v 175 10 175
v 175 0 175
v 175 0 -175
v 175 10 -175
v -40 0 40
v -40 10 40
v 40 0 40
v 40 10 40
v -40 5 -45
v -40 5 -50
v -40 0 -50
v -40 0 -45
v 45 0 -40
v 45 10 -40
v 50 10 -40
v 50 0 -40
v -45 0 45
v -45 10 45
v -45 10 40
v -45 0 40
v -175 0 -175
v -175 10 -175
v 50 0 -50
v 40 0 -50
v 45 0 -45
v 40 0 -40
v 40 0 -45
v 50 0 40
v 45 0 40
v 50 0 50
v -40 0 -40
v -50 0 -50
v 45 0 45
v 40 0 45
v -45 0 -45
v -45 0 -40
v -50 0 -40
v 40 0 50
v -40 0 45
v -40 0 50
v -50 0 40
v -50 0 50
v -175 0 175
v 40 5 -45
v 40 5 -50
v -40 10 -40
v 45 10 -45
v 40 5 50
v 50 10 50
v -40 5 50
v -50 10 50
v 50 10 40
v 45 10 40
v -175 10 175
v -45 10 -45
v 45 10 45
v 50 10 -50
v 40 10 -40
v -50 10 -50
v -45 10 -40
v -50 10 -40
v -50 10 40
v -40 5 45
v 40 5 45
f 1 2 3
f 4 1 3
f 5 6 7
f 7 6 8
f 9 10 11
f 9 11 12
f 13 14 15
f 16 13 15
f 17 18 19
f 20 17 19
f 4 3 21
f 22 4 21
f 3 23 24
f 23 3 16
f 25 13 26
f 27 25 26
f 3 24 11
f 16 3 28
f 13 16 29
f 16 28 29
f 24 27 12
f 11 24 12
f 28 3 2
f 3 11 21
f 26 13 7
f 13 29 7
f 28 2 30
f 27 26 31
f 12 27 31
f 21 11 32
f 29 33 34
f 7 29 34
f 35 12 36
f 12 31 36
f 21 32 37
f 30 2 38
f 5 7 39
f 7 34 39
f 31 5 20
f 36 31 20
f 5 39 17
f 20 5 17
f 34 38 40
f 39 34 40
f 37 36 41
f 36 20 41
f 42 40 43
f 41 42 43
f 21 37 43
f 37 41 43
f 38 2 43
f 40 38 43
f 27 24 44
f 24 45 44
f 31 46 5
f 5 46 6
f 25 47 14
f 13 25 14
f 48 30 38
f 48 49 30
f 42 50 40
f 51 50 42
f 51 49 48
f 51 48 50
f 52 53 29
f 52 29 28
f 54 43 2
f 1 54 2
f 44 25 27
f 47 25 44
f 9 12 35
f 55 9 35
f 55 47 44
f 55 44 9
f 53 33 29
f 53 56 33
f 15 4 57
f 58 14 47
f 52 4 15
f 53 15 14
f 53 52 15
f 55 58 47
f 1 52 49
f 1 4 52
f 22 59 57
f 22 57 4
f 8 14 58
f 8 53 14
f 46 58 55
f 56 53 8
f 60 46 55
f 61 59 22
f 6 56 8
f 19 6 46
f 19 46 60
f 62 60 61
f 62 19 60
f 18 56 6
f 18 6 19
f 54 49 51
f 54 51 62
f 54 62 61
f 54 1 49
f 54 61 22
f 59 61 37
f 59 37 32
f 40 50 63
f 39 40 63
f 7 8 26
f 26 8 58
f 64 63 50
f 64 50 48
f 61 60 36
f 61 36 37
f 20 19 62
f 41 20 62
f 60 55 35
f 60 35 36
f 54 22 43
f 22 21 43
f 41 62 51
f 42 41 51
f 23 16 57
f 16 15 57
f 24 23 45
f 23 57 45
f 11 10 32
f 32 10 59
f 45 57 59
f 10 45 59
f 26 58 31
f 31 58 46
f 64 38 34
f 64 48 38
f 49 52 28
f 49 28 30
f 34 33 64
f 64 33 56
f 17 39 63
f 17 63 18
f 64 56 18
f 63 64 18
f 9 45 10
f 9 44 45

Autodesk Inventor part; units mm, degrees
ref_plane "YZ Plane" through (0, 0, 0) normal (1, 0, 0) x (0, 1, 0)
ref_plane "XZ Plane" through (0, 0, 0) normal (0, 1, 0) x (-1, 0, 0)
ref_plane "XY Plane" through (0, 0, 0) normal (0, 0, 1) x (1, 0, 0)
sketch "Sketch1" plane through (0, 0, 0) normal (0, 1, 0) x (-1, 0, 0)
  line L0 (-175, 175) -> (-175, -175)
  line L1 (-175, -175) -> (175, -175)
  line L2 (175, -175) -> (175, 175)
  line L3 (175, 175) -> (-175, 175)
  line L4 (-175, 175) -> (175, -175) construction
  line L5 (-175, -175) -> (175, 175) construction
  point P0 (0, 0)
  dimension "d0" = 350
  dimension "d1" = 350
extrude "Extrusion1" add sketch "Sketch1" along normal blind 10
sketch "Sketch2" plane through (0, 10, 0) normal (0, 1, 0) x (1, 0, 0)
  line L0 (175, -175) -> (175, 175) projected
  line L1 (175, 175) -> (-175, 175) projected
  line L2 (-175, 175) -> (-175, -175) projected
  line L3 (-175, -175) -> (175, -175) projected
  line L4 (-175, 175) -> (175, -175) construction
  line L5 (-175, -175) -> (175, -175) construction
  line L6 (-175, -175) -> (161.7326, 161.7326) construction
  line L7 (40, -40) -> (40, 40)
  line L8 (40, 40) -> (-40, 40)
  line L9 (-40, 40) -> (-40, -40)
  line L10 (-40, -40) -> (40, -40)
  line L11 (40, -40) -> (-40, 40) construction
  line L12 (40, 40) -> (-40, -40) construction
  point P0 (0, 0)
  dimension "d4" = 80
  dimension "d5" = 80
extrude "Extrusion2" cut sketch "Sketch2" against normal blind 10 contours L10 L9 L8 L7
sketch "Sketch3" plane through (0, 10, 0) normal (0, 1, 0) x (1, 0, 0)
  line L0 (40, -40) -> (-40, -40) projected
  point P0 (0, 0)
sketch "Sketch4" plane through (0, 10, 0) normal (0, 1, 0) x (1, 0, 0)
  line L0 (40, -40) -> (-40, -40) construction
  line L1 (45, -40) -> (50, -40) construction
  line L2 (45, -40) -> (50, -40)
  line L3 (50, -40) -> (50, -50)
  line L4 (50, -50) -> (40, -50)
  line L5 (40, 40) -> (40, -40) projected
  line L6 (40, -50) -> (40, -45)
  line L7 (45, -45) -> (40, -45)
  line L8 (45, -45) -> (45, -40)
  line L9 (111.0748, 0) -> (-96.7509, 0) construction
  line L10 (0, -82.157) -> (0, 67.3265) construction
  line L11 (45, 40) -> (50, 40)
  line L12 (50, 40) -> (50, 50)
  line L13 (50, 50) -> (40, 50)
  line L14 (40, 50) -> (40, 45)
  line L15 (45, 45) -> (40, 45)
  line L16 (45, 45) -> (45, 40)
  line L17 (-45, -40) -> (-50, -40)
  line L18 (-50, -40) -> (-50, -50)
  line L19 (-50, -50) -> (-40, -50)
  line L20 (-40, -50) -> (-40, -45)
  line L21 (-45, -45) -> (-40, -45)
  line L22 (-45, -45) -> (-45, -40)
  line L23 (-50, 40) -> (-50, 50)
  line L24 (-45, 45) -> (-45, 40)
  line L25 (-45, 45) -> (-40, 45)
  line L26 (-40, 50) -> (-40, 45)
  line L27 (-50, 50) -> (-40, 50)
  line L28 (-45, 40) -> (-50, 40)
  point P0 (0, 0)
  dimension "d10" = 10
  dimension "d11" = 10
  dimension "d12" = 10
  dimension "d14" = 5
  dimension "d15" = 5
extrude "Extrusion3" cut sketch "Sketch4" against normal blind 10
sketch "Sketch5" plane through (0, 10, 0) normal (0, 1, 0) x (1, 0, 0)
  line L0 (-45, -45) -> (-40, -45) projected
  line L1 (40, -45) -> (-40, -45)
  line L2 (-40, -45) -> (-40, -50) projected
  line L3 (-40, -45) -> (-40, -50)
  line L4 (40, -50) -> (40, -45) projected
  line L5 (-40, -50) -> (40, -50)
  point P0 (0, 0)
extrude "Extrusion4" cut sketch "Sketch5" against normal blind 5
mirror "Mirror1" about plane through (0, 0, 0) normal (0, 0, 1) of "Extrusion4"
properties part number "Bassic Vehicle Chassis"
